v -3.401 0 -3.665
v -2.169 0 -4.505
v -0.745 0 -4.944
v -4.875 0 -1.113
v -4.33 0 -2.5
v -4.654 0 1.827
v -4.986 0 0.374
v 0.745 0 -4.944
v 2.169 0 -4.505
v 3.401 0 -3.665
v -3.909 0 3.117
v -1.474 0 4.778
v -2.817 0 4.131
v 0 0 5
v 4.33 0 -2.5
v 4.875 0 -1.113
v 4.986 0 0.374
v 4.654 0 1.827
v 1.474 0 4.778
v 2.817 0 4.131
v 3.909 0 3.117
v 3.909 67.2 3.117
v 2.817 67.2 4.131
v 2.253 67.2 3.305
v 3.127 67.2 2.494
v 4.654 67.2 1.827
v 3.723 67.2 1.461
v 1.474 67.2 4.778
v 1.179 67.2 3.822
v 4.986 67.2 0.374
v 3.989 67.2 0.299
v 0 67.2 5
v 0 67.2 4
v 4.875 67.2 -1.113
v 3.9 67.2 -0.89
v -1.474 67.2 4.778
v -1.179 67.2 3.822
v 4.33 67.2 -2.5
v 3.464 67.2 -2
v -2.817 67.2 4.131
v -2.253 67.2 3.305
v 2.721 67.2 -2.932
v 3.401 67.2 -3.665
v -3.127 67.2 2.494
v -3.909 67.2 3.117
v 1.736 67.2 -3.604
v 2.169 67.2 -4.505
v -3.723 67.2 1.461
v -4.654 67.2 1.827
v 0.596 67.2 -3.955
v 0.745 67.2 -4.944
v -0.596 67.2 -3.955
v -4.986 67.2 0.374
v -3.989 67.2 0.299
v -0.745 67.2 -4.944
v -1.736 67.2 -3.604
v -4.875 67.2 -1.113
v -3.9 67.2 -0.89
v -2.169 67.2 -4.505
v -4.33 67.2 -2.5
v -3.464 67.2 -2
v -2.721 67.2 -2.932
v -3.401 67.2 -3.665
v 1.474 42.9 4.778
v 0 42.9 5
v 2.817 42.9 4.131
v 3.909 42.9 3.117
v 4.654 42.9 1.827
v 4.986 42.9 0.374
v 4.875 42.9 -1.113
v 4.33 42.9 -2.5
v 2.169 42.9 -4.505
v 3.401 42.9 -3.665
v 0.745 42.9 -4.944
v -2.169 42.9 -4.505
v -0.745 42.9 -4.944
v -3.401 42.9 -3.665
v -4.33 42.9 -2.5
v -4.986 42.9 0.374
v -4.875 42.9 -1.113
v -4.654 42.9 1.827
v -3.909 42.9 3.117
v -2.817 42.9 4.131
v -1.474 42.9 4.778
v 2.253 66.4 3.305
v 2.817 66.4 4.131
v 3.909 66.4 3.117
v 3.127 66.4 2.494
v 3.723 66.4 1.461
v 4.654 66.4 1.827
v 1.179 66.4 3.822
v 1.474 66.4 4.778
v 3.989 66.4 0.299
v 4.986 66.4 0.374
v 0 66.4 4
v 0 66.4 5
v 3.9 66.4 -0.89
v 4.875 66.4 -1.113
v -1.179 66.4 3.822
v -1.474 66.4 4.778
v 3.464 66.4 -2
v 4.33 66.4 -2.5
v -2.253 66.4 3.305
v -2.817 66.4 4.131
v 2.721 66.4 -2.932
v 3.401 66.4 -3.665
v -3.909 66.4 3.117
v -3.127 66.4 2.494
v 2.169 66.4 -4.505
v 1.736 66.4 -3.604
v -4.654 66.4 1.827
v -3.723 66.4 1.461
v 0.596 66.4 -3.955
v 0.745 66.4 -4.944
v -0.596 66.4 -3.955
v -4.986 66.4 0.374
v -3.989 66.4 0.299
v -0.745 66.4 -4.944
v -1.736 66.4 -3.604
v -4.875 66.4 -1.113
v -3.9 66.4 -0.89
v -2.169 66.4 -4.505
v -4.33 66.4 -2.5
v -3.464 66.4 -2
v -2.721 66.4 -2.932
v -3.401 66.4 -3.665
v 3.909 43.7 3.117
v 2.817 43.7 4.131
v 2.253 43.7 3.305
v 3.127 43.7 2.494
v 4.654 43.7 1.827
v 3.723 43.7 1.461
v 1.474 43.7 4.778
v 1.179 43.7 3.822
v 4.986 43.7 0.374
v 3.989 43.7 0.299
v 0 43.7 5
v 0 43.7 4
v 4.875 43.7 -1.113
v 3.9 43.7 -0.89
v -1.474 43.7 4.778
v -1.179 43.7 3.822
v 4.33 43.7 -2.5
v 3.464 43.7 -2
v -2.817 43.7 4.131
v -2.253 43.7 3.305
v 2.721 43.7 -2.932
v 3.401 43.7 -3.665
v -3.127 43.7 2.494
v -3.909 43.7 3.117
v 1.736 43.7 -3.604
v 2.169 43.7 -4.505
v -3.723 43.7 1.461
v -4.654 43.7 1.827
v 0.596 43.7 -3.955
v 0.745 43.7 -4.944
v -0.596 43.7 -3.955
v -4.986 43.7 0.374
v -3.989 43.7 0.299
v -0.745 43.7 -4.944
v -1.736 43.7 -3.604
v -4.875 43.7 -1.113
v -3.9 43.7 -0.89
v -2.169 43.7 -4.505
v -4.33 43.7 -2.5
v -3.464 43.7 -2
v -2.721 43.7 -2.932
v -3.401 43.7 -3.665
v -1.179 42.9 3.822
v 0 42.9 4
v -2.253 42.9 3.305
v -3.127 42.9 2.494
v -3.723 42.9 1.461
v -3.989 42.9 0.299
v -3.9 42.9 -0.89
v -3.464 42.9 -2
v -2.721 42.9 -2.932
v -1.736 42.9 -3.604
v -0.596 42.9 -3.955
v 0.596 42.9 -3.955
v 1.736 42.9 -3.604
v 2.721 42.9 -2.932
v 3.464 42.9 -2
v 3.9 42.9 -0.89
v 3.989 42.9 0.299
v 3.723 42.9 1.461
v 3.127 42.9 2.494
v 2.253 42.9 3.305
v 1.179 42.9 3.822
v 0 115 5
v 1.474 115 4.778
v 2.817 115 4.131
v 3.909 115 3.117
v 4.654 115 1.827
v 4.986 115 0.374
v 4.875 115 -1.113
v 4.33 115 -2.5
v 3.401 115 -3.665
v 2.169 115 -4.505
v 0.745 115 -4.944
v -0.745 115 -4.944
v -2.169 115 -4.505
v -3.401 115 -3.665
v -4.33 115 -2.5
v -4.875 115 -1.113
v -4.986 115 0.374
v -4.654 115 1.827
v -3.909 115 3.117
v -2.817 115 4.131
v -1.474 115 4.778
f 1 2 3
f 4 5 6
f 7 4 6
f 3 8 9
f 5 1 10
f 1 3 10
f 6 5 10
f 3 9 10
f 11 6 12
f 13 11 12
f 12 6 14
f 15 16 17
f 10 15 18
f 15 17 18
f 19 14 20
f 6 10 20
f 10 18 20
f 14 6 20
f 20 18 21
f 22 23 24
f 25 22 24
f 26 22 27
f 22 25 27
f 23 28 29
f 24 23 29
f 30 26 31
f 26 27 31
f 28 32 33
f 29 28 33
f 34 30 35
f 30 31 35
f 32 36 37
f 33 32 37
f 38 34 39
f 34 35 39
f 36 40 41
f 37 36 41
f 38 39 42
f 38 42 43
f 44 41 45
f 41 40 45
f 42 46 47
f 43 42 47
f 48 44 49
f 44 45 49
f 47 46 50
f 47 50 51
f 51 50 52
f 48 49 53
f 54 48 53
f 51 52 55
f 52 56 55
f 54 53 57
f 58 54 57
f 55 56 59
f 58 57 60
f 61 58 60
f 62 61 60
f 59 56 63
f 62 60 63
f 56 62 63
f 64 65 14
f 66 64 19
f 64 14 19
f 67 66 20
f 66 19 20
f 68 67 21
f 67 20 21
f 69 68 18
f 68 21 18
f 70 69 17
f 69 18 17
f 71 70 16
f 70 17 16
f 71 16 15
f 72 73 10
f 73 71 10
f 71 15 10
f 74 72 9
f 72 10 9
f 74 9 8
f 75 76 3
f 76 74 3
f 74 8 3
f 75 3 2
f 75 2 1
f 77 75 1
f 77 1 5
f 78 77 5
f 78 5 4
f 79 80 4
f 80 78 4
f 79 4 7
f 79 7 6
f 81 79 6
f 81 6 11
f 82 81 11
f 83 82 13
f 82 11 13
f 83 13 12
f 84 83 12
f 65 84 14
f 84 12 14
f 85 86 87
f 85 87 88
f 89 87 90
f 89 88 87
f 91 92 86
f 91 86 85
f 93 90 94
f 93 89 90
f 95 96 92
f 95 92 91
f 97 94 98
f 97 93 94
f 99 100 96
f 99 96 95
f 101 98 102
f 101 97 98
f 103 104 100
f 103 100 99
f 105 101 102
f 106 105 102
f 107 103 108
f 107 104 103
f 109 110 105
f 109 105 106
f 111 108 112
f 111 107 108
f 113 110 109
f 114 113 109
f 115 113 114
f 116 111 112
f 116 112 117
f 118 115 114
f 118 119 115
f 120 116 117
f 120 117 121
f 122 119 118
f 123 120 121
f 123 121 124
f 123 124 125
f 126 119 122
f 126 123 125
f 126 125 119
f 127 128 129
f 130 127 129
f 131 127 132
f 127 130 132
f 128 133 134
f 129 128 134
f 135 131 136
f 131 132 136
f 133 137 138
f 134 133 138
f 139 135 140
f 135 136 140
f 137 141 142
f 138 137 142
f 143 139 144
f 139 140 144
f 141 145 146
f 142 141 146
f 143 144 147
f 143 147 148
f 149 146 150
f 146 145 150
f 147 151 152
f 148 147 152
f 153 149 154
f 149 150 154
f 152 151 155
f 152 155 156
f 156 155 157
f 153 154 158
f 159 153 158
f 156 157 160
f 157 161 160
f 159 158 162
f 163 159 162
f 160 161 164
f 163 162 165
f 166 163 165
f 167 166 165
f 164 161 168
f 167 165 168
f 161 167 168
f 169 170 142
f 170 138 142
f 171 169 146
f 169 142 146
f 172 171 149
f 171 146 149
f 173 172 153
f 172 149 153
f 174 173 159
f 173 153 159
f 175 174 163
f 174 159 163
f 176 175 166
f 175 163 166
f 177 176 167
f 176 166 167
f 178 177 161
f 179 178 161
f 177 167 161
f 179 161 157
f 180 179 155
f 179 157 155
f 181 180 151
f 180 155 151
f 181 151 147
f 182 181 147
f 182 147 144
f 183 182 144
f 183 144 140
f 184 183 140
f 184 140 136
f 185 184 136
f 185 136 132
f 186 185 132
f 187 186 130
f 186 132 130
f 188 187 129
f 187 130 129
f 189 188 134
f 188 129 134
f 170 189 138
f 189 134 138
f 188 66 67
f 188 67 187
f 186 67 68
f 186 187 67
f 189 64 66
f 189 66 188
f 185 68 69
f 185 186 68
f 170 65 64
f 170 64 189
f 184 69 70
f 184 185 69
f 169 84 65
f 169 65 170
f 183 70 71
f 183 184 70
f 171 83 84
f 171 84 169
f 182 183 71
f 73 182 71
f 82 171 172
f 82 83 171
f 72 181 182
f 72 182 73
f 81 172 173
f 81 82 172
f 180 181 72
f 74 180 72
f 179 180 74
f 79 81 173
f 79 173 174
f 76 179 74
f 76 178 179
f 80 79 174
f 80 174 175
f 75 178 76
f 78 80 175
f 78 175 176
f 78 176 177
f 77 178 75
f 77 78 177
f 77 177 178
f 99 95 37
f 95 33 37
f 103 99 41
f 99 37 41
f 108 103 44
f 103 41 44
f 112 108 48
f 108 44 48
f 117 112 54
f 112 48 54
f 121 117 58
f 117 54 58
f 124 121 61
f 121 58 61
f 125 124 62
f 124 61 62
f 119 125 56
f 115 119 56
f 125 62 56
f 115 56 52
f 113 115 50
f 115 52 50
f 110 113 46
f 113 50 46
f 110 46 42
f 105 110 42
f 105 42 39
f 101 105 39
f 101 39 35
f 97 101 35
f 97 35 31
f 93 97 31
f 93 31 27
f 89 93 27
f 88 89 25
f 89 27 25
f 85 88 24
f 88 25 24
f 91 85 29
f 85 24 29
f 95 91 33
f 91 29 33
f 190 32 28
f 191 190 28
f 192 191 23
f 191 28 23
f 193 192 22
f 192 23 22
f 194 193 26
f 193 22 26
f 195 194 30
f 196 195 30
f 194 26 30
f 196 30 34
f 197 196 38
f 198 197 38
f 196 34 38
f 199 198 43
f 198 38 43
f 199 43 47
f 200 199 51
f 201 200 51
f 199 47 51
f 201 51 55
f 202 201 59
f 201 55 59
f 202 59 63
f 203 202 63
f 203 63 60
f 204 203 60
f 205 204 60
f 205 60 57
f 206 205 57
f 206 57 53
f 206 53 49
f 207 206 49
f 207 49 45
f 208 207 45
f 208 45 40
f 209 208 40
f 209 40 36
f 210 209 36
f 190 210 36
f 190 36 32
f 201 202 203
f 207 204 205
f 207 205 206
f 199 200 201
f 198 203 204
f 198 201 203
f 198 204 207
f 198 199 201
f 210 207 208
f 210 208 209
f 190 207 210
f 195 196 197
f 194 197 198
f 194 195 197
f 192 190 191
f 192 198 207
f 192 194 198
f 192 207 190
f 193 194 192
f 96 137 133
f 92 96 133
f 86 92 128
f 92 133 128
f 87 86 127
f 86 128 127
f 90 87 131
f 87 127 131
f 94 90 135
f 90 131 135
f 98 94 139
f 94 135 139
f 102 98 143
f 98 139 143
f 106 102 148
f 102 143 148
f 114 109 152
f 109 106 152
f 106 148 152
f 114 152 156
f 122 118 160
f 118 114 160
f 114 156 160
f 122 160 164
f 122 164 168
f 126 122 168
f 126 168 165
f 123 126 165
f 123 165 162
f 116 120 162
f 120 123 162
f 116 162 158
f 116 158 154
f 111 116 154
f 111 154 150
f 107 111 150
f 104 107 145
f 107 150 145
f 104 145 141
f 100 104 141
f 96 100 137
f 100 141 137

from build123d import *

# Parameters (mm, degrees)
SKETCH1_R           = 5
BOSS_EXTRUDE1_DEPTH = 115
SKETCH2_W           = 1
SKETCH2_H           = 0.8
LPATTERN1_COUNT     = 2
LPATTERN1_PITCH     = 23.5


with BuildPart() as part:
    # Sketch1 → Boss-Extrude1 (new body)
    with BuildSketch(Plane(origin=(0, 0, 0), x_dir=(1, 0, 0), z_dir=(0, 1, 0))):
        with Locations(Location((0, 0, 0), (0, 0, 270))):
            Circle(SKETCH1_R)
    extrude(amount=BOSS_EXTRUDE1_DEPTH)

    # Sketch2 → Cut-Revolve1 (revolve, cut)
    with BuildSketch(Plane(origin=(0, 0, 0), x_dir=(0, 0, -1), z_dir=(1, 0, 0)), mode=Mode.PRIVATE) as cut_revolve1_sk:
        with Locations((4.5, 66.8)):
            Rectangle(SKETCH2_W, SKETCH2_H)
    cut_revolve1 = revolve(cut_revolve1_sk.sketch.rotate(Axis((0, 115, 0), (0, -1, 0)), 180), axis=Axis((0, 115, 0), (0, -1, 0)), mode=Mode.SUBTRACT)

    # LPattern1: Cut-Revolve1 ×2
    with Locations(*[(0, -i * LPATTERN1_PITCH, 0) for i in range(1, LPATTERN1_COUNT)]):
        add(cut_revolve1, mode=Mode.SUBTRACT)


solid = part.part
